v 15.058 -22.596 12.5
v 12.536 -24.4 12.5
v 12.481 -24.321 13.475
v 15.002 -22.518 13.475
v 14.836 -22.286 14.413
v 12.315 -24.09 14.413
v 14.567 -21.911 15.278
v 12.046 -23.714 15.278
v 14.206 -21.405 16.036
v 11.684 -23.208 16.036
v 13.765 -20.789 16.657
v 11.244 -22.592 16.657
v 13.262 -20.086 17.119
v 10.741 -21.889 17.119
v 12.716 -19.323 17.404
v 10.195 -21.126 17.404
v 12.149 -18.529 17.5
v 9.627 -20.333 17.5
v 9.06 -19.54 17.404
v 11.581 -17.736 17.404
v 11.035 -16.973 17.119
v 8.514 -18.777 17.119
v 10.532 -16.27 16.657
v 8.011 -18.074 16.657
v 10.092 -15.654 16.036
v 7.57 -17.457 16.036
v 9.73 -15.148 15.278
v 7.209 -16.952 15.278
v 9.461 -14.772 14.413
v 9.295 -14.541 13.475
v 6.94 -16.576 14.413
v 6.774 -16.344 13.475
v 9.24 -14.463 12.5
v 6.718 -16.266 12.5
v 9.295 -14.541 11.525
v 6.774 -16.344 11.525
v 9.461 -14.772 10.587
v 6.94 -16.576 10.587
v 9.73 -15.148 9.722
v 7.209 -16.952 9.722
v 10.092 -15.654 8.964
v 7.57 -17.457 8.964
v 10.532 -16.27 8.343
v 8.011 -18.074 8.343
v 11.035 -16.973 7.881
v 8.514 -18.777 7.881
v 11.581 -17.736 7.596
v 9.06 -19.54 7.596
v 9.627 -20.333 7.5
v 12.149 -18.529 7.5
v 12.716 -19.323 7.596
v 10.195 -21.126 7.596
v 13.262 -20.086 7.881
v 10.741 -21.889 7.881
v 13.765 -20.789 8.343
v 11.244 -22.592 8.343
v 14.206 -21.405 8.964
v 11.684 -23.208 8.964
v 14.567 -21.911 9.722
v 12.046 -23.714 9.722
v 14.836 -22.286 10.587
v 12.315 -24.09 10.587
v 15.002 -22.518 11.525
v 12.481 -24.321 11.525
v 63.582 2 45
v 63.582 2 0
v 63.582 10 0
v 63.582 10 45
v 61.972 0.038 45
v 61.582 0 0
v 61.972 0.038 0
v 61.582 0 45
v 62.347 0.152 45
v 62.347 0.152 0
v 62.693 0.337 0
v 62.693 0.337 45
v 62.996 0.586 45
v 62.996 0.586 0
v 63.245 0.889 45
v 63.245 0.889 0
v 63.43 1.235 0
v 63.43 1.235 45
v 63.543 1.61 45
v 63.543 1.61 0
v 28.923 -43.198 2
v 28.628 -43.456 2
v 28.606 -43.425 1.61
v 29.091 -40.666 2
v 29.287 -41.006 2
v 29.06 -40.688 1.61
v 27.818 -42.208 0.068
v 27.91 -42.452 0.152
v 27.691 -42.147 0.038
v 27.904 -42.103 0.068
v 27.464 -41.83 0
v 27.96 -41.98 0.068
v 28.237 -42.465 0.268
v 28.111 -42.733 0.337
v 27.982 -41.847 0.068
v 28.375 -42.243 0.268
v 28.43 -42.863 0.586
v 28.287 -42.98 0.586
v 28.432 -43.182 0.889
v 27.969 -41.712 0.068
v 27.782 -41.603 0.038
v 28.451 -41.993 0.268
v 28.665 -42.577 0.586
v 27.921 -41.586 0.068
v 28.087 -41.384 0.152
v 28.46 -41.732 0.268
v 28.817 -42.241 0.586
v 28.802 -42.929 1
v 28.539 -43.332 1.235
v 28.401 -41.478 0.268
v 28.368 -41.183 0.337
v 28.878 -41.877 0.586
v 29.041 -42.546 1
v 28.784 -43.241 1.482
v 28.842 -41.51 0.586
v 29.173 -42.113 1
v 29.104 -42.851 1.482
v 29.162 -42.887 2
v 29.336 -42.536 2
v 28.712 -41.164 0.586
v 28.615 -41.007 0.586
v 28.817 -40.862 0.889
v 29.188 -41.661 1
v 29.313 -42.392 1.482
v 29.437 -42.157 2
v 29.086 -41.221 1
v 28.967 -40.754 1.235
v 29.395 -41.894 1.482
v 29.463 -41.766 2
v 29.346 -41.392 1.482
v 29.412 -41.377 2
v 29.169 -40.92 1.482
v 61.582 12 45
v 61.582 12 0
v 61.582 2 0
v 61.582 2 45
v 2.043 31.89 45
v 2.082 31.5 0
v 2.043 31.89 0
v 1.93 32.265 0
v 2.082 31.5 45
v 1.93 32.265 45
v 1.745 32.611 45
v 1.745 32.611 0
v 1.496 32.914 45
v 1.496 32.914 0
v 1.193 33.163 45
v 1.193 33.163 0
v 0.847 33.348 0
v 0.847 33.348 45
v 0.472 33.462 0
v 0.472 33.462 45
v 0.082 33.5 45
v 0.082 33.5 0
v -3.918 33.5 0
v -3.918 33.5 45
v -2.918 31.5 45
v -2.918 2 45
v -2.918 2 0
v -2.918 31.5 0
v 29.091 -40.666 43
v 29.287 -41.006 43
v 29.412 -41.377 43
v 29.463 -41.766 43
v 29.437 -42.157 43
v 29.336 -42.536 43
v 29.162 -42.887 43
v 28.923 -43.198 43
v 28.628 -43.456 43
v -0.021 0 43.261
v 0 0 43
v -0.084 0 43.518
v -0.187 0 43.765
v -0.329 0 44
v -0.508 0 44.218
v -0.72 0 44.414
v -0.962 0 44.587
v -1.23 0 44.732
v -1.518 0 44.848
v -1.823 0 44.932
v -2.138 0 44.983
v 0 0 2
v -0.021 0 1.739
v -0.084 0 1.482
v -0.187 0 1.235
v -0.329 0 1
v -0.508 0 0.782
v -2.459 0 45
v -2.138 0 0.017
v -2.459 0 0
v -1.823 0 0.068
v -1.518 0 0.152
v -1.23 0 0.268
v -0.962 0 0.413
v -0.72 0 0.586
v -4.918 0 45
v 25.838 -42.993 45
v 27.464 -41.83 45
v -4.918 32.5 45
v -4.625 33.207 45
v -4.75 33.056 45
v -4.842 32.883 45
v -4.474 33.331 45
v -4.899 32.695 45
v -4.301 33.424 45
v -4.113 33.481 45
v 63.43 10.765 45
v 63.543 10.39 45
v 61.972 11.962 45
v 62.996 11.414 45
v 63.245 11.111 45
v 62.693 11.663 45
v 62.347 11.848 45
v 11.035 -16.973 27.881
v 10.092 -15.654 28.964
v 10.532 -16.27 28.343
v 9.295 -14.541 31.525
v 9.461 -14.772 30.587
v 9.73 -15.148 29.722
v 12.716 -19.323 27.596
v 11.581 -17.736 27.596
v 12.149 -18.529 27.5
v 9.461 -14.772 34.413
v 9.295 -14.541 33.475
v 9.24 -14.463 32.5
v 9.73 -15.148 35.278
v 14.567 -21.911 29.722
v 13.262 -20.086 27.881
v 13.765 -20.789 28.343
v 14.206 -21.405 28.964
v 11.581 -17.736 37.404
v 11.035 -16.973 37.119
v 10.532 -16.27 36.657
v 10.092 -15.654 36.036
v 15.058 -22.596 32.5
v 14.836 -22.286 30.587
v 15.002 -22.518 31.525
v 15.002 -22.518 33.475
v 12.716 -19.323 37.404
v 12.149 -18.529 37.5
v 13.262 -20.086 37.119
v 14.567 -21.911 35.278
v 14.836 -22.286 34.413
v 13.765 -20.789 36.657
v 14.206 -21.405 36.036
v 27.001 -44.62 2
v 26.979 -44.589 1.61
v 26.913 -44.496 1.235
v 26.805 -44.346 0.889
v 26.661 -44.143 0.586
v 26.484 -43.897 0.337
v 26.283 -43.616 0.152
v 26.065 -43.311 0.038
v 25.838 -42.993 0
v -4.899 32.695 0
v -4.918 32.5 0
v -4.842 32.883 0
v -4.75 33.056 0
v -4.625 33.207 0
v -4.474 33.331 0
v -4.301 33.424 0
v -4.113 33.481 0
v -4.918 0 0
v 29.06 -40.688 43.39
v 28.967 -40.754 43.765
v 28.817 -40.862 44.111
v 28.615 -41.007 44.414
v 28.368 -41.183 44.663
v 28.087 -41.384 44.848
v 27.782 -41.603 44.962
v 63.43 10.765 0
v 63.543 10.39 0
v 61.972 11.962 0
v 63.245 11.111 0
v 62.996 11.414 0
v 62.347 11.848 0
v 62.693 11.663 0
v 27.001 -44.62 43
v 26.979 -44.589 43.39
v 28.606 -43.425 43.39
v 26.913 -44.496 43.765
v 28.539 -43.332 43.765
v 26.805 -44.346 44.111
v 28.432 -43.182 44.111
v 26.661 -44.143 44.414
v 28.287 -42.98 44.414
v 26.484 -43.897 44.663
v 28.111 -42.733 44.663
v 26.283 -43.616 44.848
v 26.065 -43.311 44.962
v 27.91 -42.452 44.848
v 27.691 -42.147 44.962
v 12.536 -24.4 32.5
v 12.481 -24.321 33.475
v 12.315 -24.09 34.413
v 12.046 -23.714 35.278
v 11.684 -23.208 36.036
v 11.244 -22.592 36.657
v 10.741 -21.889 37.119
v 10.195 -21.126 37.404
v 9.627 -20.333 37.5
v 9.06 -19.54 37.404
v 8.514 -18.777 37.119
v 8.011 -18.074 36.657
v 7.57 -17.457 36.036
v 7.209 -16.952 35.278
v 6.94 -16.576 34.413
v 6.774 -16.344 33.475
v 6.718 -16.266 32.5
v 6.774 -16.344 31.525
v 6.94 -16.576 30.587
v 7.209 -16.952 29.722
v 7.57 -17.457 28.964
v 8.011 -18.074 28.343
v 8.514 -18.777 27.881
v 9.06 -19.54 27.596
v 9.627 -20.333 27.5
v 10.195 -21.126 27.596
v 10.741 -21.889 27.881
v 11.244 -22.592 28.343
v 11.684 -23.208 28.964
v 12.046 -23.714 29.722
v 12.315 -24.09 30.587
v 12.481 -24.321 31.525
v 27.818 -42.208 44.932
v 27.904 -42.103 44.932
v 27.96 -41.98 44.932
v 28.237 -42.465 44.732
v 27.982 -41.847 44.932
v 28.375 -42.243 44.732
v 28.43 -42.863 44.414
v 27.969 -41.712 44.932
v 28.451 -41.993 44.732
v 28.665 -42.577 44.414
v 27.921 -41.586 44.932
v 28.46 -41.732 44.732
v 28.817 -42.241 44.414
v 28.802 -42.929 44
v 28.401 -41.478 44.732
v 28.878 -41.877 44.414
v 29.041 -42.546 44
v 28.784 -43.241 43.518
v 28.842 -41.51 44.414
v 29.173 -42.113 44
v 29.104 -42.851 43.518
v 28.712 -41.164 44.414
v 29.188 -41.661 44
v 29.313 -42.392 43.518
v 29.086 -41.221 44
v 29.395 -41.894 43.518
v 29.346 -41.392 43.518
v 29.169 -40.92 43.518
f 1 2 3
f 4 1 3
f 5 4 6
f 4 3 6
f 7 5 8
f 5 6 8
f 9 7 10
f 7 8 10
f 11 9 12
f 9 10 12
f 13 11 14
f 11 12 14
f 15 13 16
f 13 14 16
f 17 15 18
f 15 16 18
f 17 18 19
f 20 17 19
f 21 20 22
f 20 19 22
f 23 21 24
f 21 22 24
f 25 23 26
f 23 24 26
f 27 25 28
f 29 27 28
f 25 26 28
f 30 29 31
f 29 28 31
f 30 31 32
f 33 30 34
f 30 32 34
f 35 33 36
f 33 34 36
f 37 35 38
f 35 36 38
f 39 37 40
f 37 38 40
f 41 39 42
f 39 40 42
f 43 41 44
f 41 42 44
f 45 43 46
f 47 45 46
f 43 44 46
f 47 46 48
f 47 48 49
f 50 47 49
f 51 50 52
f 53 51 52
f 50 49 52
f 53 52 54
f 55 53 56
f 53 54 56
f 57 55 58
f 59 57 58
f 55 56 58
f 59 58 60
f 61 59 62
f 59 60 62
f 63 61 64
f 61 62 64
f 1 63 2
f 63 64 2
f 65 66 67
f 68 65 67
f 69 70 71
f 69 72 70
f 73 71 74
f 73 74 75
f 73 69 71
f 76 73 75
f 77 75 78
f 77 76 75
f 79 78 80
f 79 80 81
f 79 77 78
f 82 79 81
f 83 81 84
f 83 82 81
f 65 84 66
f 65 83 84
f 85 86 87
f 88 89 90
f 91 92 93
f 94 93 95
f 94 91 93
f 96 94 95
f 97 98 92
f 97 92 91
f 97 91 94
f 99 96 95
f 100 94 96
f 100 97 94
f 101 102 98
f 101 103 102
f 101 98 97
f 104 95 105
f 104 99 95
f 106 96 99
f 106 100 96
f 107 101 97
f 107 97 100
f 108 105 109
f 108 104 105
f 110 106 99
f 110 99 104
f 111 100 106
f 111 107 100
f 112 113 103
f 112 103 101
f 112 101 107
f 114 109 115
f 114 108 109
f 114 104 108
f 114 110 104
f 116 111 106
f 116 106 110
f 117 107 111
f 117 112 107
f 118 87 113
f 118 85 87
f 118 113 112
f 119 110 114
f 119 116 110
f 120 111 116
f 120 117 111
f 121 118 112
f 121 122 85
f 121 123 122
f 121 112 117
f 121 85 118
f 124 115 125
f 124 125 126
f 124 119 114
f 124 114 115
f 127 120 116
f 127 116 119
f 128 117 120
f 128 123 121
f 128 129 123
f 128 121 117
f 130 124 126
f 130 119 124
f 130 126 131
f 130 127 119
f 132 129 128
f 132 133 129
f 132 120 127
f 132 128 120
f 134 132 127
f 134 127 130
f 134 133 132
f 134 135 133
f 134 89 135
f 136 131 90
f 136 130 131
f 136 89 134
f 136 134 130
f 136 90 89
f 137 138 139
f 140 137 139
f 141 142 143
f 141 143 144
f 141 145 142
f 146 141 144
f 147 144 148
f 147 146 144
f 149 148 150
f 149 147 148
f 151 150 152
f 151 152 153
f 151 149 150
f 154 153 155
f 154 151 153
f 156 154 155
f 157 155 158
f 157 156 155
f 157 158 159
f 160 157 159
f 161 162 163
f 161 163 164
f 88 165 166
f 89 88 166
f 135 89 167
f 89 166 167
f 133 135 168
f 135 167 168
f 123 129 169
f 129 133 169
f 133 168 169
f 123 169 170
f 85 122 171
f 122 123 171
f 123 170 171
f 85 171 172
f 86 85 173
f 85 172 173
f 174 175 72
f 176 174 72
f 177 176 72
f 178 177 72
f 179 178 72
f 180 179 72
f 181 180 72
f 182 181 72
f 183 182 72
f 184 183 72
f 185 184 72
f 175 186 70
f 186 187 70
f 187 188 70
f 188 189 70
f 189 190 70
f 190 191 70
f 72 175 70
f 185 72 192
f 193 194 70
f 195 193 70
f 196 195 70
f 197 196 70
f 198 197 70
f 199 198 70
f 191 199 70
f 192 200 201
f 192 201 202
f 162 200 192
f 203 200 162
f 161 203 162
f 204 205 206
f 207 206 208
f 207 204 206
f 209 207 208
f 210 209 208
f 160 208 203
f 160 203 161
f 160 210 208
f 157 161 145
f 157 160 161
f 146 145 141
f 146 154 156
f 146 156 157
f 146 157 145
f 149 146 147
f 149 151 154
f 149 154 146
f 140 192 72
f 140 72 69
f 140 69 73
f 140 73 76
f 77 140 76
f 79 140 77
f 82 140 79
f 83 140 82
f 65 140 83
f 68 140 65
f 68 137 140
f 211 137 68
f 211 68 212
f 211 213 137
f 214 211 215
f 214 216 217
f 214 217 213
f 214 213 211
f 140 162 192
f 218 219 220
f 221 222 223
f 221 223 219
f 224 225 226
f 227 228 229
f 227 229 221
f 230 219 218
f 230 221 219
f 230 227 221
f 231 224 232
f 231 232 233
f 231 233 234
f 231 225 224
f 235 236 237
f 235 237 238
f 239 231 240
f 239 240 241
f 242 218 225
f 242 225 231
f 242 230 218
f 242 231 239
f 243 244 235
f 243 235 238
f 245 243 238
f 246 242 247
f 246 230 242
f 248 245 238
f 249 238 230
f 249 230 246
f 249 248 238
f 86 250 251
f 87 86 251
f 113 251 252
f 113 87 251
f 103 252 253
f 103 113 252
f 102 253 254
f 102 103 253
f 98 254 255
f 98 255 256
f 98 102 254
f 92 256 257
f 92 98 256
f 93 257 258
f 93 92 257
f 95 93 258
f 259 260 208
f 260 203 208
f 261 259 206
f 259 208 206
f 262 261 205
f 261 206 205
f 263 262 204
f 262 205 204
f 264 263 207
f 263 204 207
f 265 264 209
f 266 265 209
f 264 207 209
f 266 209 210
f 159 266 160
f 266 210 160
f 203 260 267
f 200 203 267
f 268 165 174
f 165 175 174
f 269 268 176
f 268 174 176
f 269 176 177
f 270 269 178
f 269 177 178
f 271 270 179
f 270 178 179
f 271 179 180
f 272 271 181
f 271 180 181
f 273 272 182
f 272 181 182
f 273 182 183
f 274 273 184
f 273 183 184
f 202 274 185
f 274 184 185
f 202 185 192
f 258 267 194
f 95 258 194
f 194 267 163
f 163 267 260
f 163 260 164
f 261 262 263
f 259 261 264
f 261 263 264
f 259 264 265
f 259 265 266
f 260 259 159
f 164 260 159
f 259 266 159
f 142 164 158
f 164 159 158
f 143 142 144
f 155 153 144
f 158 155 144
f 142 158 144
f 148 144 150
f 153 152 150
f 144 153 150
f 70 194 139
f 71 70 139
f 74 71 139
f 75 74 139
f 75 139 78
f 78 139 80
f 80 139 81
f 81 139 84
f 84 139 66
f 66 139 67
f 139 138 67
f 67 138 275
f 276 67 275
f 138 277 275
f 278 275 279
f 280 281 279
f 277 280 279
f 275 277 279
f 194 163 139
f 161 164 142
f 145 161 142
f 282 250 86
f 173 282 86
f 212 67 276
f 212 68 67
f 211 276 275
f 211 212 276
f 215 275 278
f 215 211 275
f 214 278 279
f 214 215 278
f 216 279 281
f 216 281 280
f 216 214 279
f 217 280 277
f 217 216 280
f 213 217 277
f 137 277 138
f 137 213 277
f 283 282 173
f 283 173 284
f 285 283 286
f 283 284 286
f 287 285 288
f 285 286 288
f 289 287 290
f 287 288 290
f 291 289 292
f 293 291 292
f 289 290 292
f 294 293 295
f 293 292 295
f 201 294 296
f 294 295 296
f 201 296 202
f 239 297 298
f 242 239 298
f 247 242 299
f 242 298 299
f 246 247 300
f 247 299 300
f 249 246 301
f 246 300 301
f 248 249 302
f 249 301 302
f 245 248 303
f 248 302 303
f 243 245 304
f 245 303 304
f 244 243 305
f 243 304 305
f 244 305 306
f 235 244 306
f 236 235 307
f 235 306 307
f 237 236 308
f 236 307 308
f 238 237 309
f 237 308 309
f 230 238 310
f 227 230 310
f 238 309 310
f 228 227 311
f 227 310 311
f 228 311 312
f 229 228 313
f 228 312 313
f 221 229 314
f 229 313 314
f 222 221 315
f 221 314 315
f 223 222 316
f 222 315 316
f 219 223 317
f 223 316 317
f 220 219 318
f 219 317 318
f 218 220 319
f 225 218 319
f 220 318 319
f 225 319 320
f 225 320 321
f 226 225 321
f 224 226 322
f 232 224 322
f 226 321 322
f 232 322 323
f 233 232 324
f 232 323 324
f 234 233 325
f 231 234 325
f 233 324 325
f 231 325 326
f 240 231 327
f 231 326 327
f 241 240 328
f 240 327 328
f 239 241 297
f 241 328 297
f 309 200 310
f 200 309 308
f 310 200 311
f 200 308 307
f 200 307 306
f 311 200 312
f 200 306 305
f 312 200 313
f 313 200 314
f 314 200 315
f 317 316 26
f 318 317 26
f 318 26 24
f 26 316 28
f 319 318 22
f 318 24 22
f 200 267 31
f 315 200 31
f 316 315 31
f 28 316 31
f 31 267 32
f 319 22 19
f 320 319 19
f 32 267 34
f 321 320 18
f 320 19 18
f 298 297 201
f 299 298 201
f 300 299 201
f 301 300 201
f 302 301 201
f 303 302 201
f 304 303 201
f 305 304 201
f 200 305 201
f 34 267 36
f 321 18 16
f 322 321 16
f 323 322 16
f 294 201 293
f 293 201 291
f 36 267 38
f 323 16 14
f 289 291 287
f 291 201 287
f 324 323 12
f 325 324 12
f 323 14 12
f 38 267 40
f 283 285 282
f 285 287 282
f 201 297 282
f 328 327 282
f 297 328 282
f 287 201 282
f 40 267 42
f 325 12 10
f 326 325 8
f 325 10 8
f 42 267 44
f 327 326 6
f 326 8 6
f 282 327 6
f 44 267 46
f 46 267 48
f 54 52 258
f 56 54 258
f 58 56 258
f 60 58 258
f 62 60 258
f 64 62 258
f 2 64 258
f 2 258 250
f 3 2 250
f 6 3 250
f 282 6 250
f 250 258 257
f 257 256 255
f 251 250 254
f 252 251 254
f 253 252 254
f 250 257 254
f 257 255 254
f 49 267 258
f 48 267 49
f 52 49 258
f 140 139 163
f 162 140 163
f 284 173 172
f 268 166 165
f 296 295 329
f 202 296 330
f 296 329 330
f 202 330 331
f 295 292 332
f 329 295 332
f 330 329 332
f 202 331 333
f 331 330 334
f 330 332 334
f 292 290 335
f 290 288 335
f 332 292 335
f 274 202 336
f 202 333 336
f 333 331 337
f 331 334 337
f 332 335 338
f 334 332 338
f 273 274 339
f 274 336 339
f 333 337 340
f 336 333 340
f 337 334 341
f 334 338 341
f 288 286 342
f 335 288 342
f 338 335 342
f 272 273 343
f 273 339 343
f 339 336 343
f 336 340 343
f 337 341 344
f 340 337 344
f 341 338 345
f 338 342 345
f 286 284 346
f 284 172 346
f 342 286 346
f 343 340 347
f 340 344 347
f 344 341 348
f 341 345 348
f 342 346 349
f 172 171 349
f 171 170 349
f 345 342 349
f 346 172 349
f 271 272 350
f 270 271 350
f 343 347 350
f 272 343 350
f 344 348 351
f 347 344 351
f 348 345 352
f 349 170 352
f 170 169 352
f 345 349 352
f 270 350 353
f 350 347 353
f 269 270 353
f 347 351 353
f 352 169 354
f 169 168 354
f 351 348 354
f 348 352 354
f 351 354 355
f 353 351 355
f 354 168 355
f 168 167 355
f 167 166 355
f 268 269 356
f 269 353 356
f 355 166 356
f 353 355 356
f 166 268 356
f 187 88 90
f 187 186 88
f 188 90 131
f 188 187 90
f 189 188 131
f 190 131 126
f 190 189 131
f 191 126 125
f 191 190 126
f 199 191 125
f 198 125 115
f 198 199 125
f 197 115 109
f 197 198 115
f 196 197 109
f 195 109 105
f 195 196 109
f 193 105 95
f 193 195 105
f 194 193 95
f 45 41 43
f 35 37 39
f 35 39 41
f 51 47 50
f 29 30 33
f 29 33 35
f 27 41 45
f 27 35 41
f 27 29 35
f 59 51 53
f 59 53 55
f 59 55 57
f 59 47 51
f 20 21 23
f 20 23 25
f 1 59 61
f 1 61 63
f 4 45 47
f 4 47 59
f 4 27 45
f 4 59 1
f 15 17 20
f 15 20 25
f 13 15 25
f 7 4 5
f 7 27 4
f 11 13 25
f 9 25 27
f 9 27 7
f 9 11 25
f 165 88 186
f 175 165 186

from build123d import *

# Parameters (mm, degrees)
F1_DEPTH = 45
F2_R     = 1.99999
F4_R     = 1
F3_R     = 5
F5_DEPTH = 3.1


# Not quite as in the source:
# - a fillet or chamfer is up to 0.001 mm smaller than in the source, because OpenCascade refuses the exact size
# - a feature names something its author has since deleted; it is built from what else it names


with BuildPart() as f1:
    # F0 (on Top) → F1 (new body)
    with BuildSketch(Plane.XY):
        Polygon((30.2546076554, -42.2925373514), (0, 0), (63.5818746515, 0), (63.5818746515, 12), (61.5818746515, 12), (61.5818746515, 2), (-2.9181253485, 2), (-2.9181253485, 31.5), (2.0818746515, 31.5), (2.0818746515, 33.5), (-4.9181253485, 33.5), (-4.9181253485, 31.5), (-4.9181253485, 0), (27.0013355514, -44.6198148634), align=None)
    extrude(amount=F1_DEPTH)

    # F2 (radius 2 in the source; OpenCascade refuses exactly that, so slightly less here)
    f2_edges = [f1.edges().sort_by_distance(p)[0] for p in [
        (63.581875, 0, 22.5),
        (63.581875, 12, 22.5),
        (30.254608, -42.292537, 22.5),
        (28.627972, -43.456176, 45),
        (28.627972, -43.456176, 0),
        (15.127304, -21.146269, 45),
        (15.127304, -21.146269, 0),
        (2.081875, 33.5, 22.5),
    ]]
    fillet(f2_edges, radius=F2_R)

    # F4
    f4_edges = [f1.edges().sort_by_distance(p)[0] for p in [
        (-4.918125, 33.5, 22.5),
    ]]
    fillet(f4_edges, radius=F4_R)

    # F3 (on face) → F5 (cut)
    with BuildSketch(Plane(origin=(-3.253272104, -2.327277512, 0), x_dir=(0.581819378, -0.813318026, 0), z_dir=(-0.813318026, -0.581819378, 0))):
        with Locations((22.1385393689, 12.5)):
            Circle(F3_R)
        with Locations((22.1385393689, 32.5)):
            Circle(F3_R)
    extrude(amount=-F5_DEPTH, mode=Mode.SUBTRACT)


solid = f1.part
